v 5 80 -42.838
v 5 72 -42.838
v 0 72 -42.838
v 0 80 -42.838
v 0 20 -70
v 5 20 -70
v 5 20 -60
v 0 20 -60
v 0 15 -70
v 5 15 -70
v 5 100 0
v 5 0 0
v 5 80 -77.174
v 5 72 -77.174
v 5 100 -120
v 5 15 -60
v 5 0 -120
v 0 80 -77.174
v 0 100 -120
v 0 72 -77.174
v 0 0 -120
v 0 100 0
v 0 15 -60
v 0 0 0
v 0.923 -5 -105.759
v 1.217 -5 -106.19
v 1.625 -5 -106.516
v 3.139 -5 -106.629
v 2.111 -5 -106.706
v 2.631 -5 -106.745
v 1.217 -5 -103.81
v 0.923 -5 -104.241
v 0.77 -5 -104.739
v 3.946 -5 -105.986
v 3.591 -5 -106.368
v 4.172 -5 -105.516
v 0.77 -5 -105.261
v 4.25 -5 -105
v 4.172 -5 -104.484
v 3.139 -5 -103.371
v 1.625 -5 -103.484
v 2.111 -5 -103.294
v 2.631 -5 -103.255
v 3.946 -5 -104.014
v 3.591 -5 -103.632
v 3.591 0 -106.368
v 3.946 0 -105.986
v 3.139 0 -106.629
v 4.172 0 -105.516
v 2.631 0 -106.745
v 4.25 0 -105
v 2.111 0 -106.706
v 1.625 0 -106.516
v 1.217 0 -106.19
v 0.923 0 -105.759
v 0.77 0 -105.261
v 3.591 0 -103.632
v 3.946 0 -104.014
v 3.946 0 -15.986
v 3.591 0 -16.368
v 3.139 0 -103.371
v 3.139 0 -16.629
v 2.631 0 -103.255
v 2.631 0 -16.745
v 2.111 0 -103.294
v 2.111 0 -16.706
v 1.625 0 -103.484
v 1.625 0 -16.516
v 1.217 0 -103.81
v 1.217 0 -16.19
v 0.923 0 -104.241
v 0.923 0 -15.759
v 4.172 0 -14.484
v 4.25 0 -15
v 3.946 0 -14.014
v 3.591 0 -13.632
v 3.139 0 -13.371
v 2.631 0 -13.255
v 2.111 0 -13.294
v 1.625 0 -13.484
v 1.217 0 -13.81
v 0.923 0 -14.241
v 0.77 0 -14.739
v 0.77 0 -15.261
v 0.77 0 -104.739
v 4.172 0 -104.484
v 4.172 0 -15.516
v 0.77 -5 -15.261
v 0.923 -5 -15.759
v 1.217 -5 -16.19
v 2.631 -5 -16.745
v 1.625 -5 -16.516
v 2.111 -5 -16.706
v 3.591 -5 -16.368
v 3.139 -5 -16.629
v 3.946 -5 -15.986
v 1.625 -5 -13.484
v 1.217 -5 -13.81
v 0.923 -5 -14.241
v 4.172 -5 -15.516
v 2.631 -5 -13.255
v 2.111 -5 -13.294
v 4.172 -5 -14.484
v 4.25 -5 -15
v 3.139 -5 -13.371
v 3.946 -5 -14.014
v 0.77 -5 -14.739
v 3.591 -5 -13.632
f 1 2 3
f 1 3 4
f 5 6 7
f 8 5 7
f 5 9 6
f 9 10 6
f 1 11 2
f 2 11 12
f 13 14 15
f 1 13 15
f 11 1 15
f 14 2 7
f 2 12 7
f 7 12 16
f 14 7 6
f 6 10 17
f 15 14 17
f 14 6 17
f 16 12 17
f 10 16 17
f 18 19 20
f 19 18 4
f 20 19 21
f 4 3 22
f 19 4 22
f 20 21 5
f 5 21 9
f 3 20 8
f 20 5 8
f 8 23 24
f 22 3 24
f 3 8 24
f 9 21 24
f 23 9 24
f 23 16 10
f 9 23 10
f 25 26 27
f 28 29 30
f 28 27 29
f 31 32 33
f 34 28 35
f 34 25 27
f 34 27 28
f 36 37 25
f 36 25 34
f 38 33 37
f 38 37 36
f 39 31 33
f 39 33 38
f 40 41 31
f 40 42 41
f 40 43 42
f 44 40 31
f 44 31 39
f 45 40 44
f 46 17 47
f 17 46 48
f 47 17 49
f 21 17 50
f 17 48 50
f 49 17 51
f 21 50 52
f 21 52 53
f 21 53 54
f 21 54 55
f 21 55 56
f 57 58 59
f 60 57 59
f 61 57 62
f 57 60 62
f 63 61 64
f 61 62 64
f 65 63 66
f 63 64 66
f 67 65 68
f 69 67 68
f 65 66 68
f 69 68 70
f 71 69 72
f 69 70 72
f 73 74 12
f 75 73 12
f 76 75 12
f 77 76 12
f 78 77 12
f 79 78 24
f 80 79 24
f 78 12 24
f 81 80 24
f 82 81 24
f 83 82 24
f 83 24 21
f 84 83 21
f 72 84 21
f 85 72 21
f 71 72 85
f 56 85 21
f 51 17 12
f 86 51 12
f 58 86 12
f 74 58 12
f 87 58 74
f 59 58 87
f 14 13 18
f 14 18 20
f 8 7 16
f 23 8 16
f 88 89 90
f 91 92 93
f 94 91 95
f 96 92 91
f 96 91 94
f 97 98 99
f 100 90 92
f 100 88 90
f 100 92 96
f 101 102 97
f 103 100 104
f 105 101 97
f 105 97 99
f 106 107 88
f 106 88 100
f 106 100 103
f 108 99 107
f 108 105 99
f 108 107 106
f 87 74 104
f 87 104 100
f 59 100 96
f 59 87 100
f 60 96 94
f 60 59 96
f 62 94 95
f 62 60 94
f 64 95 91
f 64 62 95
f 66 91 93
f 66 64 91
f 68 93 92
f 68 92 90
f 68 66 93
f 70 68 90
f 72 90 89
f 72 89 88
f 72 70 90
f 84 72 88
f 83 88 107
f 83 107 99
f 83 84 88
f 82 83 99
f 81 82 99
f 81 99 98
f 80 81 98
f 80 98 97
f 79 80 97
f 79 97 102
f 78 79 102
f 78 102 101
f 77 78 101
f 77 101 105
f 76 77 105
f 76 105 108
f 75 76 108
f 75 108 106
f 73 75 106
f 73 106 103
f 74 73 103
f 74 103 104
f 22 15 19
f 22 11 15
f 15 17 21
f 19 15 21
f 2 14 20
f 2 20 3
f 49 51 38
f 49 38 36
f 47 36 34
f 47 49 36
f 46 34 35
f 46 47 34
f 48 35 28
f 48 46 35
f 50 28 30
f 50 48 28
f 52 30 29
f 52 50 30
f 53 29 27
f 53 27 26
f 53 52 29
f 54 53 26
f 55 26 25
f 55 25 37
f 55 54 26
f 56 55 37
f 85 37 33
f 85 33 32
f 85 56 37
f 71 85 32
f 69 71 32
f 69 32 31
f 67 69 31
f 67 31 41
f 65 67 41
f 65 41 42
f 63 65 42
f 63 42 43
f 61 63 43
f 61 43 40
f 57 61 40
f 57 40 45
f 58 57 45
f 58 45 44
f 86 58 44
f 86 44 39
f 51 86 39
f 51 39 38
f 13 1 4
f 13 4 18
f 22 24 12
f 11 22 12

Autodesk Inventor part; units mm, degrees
ref_plane "YZ Plane" through (0, 0, 0) normal (1, 0, 0) x (0, 1, 0)
ref_plane "XZ Plane" through (0, 0, 0) normal (0, 1, 0) x (-1, 0, 0)
ref_plane "XY Plane" through (0, 0, 0) normal (0, 0, 1) x (1, 0, 0)
sketch "Sketch1" plane through (0, 0, 0) normal (0, 1, 0) x (-1, 0, 0)
  line L0 (0, 0) -> (-5, 0)
  line L1 (-5, 0) -> (-5, -120)
  line L2 (-5, -120) -> (0, -120)
  line L3 (0, -120) -> (0, 0)
  dimension "d0" = 5
  dimension "d1" = 120
extrude "Extrusion1" add sketch "Sketch1" along normal blind 100
sketch "Sketch2" plane through (0, 0, 0) normal (0, -1, 0) x (1, 0, 0)
  line L0 (0, -120) -> (0, 0) projected
  line L1 (0, 0) -> (2.5, 0)
  line L2 (2.5, 0) -> (2.5, -15)
  line L3 (2.5, -15) -> (0, -15)
  line L4 (0, -15) -> (0, 0)
  circle A0 centre (2.5, -15) radius 1.75
  dimension "d4" = 2.5
  dimension "d5" = 15
  dimension "d6" = 3.5
extrude "Extrusion2" add sketch "Sketch2" along normal blind 5 contours A0 L2 L3 | L3 L2 A0
sketch "Sketch3" plane through (0, 0, 0) normal (0, -1, 0) x (1, 0, 0)
  line L0 (5, 0) -> (5, -120) projected
  line L1 (5, -120) -> (2.5, -120)
  line L2 (2.5, -120) -> (2.5, -105)
  line L3 (2.5, -105) -> (5, -105)
  line L4 (5, -105) -> (5, -120)
  circle A0 centre (2.5, -105) radius 1.75
  point P0 (0, 0)
  dimension "d9" = 2.5
  dimension "d10" = 15
  dimension "d11" = 3.5
extrude "Extrusion3" add sketch "Sketch3" along normal blind 5 contours A0 L2 L3 | L3 L2 A0
sketch "Sketch4" plane through (5, 0, 0) normal (1, 0, 0) x (0, 0, -1)
  point P0 (0, 0)
sketch "Sketch5" plane through (5, 0, 0) normal (1, 0, 0) x (0, 0, -1)
  point P0 (0, 0)
sketch "Sketch6" plane through (5, 0, 0) normal (1, 0, 0) x (0, 0, -1)
  point P0 (0, 0)
sketch "Sketch7" plane through (5, 0, 0) normal (1, 0, 0) x (0, 0, -1)
  line L0 (120, 100) -> (0, 100) projected
  line L1 (0, 100) -> (42.838, 100)
  line L2 (42.838, 100) -> (42.838, 80)
  line L3 (42.838, 80) -> (0, 80)
  line L4 (0, 80) -> (0, 100)
  line L5 (42.838, 80) -> (77.174, 80)
  line L6 (77.174, 80) -> (77.174, 72)
  line L7 (77.174, 72) -> (42.838, 72)
  line L8 (42.838, 72) -> (42.838, 80)
  point P0 (0, 0)
  dimension "d14" = 42.838
  dimension "d15" = 20
  dimension "d16" = 34.336
  dimension "d17" = 8
extrude "Extrusion4" cut sketch "Sketch7" against normal blind 10 contours L5 L6 L7 L8
sketch "Sketch8" plane through (5, 0, 0) normal (1, 0, 0) x (0, 0, -1)
  line L0 (0, 0) -> (60, 0)
  line L1 (60, 0) -> (60, 15)
  line L2 (60, 15) -> (0, 15)
  line L3 (0, 15) -> (0, 0)
  line L4 (60, 15) -> (70, 15)
  line L5 (70, 15) -> (70, 20)
  line L6 (70, 20) -> (60, 20)
  line L7 (60, 20) -> (60, 15)
  dimension "d20" = 60
  dimension "d21" = 15
  dimension "d22" = 10
  dimension "d23" = 5
extrude "Extrusion5" cut sketch "Sketch8" against normal blind 10 contours L7 L6 L5 L4
properties part number "expo3"
